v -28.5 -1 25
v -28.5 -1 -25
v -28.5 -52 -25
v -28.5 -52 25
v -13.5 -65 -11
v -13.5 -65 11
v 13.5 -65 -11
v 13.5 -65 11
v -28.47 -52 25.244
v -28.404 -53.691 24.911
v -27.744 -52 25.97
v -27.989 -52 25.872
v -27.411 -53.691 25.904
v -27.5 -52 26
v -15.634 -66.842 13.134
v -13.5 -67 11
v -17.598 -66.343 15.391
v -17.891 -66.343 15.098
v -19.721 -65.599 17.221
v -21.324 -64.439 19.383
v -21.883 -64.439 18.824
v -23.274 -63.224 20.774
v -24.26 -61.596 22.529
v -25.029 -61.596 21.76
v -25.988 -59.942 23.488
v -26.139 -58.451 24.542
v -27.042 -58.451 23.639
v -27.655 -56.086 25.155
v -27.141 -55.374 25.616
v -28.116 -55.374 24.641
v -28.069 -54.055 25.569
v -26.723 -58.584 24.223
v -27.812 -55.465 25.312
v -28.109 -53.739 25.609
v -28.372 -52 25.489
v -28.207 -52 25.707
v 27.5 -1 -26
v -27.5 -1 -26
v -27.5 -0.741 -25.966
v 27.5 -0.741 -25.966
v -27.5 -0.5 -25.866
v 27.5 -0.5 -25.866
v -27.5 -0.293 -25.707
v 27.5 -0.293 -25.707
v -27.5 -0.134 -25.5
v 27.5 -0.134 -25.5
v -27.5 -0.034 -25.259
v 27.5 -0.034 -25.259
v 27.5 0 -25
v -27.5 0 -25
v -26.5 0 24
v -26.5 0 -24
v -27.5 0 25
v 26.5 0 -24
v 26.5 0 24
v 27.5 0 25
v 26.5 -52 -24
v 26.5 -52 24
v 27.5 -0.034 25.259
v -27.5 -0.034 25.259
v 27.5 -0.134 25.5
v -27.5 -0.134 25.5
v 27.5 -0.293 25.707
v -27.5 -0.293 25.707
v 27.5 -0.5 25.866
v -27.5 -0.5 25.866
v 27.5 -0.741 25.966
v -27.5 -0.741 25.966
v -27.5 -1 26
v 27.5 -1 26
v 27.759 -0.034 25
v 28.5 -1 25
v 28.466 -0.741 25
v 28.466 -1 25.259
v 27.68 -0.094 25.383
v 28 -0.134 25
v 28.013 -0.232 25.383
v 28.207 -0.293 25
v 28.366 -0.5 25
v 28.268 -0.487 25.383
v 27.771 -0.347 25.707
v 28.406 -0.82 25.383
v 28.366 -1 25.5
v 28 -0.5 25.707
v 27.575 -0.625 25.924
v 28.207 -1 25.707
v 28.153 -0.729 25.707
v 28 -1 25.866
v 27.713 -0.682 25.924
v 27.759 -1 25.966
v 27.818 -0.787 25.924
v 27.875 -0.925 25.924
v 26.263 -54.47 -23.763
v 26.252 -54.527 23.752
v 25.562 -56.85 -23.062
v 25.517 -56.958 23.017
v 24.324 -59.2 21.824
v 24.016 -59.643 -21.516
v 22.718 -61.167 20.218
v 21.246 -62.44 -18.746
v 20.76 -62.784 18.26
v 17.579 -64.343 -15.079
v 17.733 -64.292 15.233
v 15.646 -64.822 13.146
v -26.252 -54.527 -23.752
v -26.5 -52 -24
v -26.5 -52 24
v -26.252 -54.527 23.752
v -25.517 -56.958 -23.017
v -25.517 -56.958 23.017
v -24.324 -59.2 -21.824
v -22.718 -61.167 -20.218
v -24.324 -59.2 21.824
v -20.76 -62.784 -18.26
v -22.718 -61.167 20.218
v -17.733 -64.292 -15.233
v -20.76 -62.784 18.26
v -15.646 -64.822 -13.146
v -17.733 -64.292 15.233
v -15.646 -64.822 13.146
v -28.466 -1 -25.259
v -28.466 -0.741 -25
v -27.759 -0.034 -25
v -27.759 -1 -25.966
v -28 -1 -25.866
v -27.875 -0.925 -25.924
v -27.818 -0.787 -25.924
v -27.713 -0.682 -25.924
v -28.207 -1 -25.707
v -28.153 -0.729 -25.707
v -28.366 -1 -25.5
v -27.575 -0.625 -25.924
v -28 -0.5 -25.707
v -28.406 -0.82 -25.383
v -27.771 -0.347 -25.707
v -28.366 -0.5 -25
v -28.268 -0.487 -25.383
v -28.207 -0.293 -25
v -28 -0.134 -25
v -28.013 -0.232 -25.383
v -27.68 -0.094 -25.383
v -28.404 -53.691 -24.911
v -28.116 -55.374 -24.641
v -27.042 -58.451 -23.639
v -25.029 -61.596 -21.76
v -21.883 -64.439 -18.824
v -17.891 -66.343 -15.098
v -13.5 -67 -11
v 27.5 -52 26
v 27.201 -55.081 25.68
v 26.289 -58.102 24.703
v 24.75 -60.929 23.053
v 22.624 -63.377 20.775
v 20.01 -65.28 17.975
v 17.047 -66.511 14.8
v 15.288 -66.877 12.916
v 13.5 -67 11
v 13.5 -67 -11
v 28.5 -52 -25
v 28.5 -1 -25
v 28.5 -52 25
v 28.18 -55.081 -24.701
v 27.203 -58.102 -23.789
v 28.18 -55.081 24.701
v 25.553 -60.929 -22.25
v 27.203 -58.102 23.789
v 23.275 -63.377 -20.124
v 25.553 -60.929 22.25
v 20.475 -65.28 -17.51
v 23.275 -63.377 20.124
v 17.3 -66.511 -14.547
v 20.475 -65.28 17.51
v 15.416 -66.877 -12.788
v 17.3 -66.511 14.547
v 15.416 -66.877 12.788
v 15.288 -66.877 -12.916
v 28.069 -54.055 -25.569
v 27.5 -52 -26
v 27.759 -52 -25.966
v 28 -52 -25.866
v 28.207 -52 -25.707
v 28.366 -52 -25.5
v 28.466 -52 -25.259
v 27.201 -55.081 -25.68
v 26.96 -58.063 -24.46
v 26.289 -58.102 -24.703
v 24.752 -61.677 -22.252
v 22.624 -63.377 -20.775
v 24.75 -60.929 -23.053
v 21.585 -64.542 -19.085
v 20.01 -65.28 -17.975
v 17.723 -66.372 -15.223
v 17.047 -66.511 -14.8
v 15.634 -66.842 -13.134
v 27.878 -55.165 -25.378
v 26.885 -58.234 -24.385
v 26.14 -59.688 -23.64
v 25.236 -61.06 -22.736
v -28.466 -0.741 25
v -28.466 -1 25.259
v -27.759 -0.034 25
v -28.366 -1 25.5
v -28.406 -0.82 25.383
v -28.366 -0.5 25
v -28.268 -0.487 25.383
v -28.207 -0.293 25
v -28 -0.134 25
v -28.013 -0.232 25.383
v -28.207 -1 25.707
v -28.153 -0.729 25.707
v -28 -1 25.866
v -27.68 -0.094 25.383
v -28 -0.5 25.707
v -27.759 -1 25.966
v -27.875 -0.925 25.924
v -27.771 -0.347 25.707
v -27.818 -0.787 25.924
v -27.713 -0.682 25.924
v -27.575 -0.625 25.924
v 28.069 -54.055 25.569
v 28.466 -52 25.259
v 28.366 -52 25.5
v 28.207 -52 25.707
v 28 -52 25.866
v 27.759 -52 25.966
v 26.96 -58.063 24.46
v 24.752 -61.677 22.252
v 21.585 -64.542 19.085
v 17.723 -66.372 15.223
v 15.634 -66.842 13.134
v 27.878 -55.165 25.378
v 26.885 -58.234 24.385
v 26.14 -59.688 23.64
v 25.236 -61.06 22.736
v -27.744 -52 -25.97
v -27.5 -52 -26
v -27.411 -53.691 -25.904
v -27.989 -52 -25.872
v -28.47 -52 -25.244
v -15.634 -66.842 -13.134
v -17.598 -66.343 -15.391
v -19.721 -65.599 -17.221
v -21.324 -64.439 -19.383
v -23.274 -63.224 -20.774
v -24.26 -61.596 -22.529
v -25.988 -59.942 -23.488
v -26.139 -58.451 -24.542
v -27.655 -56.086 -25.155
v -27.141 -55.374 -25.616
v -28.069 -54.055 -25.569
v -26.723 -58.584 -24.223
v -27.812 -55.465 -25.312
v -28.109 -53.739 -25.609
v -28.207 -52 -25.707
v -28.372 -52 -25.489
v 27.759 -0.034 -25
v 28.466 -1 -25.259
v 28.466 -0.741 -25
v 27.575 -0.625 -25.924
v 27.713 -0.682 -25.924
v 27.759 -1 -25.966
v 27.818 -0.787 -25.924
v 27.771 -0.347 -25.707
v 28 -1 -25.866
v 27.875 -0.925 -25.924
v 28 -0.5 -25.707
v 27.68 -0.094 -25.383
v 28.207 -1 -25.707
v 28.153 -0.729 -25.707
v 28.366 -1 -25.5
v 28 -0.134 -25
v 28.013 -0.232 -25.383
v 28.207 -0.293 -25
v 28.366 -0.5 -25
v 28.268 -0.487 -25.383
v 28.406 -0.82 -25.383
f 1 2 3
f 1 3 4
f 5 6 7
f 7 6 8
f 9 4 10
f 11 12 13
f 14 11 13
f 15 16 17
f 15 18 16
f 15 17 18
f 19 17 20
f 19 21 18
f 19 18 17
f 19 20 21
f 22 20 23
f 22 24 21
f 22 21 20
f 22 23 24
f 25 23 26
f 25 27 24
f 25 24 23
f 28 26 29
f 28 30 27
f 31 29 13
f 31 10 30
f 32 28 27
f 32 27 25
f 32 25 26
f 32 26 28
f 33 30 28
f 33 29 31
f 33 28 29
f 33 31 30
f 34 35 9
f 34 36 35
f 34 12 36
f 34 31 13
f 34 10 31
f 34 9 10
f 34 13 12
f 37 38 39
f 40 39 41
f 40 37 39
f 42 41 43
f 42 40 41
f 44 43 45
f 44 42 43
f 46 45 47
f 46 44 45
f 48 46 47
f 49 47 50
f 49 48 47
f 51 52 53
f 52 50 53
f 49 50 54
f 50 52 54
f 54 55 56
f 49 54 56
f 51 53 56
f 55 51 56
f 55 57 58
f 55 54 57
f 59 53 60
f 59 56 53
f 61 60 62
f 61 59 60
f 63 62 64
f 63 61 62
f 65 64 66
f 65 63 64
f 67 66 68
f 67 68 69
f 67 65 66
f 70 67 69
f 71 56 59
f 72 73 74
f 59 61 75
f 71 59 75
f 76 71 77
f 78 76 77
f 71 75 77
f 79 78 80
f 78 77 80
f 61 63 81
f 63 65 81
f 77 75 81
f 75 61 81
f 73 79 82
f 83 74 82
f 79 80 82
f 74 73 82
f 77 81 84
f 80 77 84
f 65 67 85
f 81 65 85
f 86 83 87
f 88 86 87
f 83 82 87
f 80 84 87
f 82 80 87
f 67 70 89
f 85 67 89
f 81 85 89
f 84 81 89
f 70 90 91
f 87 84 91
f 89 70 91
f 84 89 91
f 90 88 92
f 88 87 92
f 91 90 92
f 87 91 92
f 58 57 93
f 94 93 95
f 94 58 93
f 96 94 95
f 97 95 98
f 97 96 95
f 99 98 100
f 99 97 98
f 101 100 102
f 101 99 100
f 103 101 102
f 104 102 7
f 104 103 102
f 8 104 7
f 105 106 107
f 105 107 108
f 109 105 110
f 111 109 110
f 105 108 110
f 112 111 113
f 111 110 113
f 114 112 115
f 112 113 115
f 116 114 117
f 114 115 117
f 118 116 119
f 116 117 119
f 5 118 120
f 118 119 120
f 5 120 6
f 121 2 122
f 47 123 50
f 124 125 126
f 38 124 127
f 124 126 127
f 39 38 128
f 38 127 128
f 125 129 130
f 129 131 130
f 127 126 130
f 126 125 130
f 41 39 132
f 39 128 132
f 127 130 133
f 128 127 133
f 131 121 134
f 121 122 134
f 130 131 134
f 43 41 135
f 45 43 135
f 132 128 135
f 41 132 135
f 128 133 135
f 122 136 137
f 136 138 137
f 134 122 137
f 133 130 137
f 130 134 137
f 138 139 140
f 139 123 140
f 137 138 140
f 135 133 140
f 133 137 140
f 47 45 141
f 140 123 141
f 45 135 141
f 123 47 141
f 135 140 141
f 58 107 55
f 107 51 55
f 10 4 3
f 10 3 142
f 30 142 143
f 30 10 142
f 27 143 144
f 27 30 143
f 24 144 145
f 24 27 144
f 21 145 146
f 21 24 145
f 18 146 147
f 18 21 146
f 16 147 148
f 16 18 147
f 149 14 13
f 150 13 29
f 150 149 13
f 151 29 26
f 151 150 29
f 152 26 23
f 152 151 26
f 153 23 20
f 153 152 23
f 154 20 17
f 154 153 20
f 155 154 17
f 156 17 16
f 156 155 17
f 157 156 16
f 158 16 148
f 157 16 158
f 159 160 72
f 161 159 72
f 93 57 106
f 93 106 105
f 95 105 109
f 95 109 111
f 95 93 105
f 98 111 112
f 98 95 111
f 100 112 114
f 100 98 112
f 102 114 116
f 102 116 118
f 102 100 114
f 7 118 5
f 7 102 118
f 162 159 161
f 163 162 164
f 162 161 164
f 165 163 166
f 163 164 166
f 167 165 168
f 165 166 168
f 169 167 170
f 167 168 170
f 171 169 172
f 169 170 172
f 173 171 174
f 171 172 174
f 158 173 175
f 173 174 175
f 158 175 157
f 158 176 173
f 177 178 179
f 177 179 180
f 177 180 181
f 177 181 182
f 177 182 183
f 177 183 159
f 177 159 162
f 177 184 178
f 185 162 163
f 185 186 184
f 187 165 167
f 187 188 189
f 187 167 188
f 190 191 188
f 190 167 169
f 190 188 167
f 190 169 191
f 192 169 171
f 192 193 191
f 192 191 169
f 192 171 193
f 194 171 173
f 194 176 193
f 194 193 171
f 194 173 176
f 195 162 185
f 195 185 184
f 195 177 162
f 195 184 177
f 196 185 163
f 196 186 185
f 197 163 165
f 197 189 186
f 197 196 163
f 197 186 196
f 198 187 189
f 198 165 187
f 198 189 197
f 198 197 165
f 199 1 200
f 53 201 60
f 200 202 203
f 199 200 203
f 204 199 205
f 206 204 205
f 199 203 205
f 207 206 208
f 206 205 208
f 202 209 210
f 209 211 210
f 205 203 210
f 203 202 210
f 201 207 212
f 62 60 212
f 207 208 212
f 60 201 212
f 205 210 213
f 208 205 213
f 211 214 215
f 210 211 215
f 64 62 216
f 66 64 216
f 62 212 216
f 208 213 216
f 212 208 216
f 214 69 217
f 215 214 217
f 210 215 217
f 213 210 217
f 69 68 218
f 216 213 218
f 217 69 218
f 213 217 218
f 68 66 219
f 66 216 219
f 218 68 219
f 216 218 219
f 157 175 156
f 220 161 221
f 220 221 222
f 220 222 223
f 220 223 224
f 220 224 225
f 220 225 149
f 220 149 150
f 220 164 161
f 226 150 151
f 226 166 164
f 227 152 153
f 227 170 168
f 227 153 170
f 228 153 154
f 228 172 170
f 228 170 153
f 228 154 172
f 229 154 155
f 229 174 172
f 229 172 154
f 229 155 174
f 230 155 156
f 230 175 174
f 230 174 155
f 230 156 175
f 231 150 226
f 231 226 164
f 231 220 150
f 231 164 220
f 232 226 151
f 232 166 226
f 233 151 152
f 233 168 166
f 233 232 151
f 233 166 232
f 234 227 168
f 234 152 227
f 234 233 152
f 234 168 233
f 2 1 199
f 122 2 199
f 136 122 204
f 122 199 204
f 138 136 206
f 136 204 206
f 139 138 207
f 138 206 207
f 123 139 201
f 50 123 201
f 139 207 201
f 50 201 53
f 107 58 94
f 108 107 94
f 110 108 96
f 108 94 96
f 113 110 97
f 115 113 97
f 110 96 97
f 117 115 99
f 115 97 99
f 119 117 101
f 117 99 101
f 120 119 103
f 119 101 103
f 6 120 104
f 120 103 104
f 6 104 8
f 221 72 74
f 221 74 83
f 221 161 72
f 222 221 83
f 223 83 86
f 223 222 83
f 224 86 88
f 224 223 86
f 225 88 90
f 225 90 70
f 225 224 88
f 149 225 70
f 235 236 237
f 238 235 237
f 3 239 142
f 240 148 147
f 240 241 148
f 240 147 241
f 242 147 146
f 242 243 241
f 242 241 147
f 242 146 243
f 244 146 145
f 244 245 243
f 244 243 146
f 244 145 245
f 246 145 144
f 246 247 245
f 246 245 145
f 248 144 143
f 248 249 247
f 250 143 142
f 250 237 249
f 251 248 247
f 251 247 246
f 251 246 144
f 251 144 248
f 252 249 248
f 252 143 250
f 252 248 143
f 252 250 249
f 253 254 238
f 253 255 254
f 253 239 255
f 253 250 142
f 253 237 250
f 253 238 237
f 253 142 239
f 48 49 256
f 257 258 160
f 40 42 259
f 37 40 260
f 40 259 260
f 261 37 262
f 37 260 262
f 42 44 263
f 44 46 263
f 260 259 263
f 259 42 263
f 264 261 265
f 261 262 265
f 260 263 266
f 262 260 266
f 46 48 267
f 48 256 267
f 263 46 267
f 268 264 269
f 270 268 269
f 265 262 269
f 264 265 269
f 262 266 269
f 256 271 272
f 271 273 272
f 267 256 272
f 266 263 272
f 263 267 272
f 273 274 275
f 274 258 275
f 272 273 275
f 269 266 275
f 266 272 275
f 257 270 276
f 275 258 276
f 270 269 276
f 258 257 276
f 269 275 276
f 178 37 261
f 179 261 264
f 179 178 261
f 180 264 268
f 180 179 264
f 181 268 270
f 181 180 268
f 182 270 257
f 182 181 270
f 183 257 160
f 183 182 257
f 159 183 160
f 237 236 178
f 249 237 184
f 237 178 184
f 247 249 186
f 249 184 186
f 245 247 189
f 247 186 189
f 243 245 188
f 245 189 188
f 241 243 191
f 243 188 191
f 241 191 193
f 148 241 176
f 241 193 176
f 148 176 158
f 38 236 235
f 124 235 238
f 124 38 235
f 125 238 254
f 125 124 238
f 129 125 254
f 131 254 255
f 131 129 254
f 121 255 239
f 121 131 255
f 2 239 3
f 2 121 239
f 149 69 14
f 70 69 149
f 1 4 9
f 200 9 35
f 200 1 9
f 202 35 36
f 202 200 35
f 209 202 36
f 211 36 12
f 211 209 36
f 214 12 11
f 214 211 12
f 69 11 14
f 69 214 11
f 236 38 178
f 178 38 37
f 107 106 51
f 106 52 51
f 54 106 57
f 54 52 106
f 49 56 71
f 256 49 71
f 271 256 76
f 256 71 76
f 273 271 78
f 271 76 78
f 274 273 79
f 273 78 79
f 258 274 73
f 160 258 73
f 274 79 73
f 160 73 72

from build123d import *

# Parameters (mm, degrees)
F0_W     = 57
F0_H     = 52
F1_DEPTH = 67
F2_R     = 15
F3_T     = -2
F4_R     = 1
F5_R     = 1
F6_R     = 1


with BuildPart() as f1:
    # F0 (on Front) → F1 (new body)
    with BuildSketch(Plane.XZ):
        Rectangle(F0_W, F0_H)
    extrude(amount=F1_DEPTH)

    # F2
    f2_edges = [f1.edges().sort_by_distance(p)[0] for p in [
        (0, -67, 26),
        (-28.5, -67, 0),
        (0, -67, -26),
        (28.5, -67, 0),
    ]]
    fillet(f2_edges, radius=F2_R)

    # F3
    f3_openings = [f1.faces().sort_by_distance(p)[0] for p in [
        (0, 0, 0),
    ]]
    offset(amount=F3_T, openings=f3_openings)

    # F4
    f4_edges = [f1.edges().sort_by_distance(p)[0] for p in [
        (-28.5, 0, 0),
    ]]
    fillet(f4_edges, radius=F4_R)

    # F5
    f5_edges = [f1.edges().sort_by_distance(p)[0] for p in [
        (28.5, 0, 0),
    ]]
    fillet(f5_edges, radius=F5_R)

    # F6
    f6_edges = [f1.edges().sort_by_distance(p)[0] for p in [
        (28.5, -26.5, 26),
        (28.5, -26.5, -26),
        (-28.5, -26.5, 26),
        (-28.5, -26.5, -26),
    ]]
    fillet(f6_edges, radius=F6_R)


solid = f1.part
